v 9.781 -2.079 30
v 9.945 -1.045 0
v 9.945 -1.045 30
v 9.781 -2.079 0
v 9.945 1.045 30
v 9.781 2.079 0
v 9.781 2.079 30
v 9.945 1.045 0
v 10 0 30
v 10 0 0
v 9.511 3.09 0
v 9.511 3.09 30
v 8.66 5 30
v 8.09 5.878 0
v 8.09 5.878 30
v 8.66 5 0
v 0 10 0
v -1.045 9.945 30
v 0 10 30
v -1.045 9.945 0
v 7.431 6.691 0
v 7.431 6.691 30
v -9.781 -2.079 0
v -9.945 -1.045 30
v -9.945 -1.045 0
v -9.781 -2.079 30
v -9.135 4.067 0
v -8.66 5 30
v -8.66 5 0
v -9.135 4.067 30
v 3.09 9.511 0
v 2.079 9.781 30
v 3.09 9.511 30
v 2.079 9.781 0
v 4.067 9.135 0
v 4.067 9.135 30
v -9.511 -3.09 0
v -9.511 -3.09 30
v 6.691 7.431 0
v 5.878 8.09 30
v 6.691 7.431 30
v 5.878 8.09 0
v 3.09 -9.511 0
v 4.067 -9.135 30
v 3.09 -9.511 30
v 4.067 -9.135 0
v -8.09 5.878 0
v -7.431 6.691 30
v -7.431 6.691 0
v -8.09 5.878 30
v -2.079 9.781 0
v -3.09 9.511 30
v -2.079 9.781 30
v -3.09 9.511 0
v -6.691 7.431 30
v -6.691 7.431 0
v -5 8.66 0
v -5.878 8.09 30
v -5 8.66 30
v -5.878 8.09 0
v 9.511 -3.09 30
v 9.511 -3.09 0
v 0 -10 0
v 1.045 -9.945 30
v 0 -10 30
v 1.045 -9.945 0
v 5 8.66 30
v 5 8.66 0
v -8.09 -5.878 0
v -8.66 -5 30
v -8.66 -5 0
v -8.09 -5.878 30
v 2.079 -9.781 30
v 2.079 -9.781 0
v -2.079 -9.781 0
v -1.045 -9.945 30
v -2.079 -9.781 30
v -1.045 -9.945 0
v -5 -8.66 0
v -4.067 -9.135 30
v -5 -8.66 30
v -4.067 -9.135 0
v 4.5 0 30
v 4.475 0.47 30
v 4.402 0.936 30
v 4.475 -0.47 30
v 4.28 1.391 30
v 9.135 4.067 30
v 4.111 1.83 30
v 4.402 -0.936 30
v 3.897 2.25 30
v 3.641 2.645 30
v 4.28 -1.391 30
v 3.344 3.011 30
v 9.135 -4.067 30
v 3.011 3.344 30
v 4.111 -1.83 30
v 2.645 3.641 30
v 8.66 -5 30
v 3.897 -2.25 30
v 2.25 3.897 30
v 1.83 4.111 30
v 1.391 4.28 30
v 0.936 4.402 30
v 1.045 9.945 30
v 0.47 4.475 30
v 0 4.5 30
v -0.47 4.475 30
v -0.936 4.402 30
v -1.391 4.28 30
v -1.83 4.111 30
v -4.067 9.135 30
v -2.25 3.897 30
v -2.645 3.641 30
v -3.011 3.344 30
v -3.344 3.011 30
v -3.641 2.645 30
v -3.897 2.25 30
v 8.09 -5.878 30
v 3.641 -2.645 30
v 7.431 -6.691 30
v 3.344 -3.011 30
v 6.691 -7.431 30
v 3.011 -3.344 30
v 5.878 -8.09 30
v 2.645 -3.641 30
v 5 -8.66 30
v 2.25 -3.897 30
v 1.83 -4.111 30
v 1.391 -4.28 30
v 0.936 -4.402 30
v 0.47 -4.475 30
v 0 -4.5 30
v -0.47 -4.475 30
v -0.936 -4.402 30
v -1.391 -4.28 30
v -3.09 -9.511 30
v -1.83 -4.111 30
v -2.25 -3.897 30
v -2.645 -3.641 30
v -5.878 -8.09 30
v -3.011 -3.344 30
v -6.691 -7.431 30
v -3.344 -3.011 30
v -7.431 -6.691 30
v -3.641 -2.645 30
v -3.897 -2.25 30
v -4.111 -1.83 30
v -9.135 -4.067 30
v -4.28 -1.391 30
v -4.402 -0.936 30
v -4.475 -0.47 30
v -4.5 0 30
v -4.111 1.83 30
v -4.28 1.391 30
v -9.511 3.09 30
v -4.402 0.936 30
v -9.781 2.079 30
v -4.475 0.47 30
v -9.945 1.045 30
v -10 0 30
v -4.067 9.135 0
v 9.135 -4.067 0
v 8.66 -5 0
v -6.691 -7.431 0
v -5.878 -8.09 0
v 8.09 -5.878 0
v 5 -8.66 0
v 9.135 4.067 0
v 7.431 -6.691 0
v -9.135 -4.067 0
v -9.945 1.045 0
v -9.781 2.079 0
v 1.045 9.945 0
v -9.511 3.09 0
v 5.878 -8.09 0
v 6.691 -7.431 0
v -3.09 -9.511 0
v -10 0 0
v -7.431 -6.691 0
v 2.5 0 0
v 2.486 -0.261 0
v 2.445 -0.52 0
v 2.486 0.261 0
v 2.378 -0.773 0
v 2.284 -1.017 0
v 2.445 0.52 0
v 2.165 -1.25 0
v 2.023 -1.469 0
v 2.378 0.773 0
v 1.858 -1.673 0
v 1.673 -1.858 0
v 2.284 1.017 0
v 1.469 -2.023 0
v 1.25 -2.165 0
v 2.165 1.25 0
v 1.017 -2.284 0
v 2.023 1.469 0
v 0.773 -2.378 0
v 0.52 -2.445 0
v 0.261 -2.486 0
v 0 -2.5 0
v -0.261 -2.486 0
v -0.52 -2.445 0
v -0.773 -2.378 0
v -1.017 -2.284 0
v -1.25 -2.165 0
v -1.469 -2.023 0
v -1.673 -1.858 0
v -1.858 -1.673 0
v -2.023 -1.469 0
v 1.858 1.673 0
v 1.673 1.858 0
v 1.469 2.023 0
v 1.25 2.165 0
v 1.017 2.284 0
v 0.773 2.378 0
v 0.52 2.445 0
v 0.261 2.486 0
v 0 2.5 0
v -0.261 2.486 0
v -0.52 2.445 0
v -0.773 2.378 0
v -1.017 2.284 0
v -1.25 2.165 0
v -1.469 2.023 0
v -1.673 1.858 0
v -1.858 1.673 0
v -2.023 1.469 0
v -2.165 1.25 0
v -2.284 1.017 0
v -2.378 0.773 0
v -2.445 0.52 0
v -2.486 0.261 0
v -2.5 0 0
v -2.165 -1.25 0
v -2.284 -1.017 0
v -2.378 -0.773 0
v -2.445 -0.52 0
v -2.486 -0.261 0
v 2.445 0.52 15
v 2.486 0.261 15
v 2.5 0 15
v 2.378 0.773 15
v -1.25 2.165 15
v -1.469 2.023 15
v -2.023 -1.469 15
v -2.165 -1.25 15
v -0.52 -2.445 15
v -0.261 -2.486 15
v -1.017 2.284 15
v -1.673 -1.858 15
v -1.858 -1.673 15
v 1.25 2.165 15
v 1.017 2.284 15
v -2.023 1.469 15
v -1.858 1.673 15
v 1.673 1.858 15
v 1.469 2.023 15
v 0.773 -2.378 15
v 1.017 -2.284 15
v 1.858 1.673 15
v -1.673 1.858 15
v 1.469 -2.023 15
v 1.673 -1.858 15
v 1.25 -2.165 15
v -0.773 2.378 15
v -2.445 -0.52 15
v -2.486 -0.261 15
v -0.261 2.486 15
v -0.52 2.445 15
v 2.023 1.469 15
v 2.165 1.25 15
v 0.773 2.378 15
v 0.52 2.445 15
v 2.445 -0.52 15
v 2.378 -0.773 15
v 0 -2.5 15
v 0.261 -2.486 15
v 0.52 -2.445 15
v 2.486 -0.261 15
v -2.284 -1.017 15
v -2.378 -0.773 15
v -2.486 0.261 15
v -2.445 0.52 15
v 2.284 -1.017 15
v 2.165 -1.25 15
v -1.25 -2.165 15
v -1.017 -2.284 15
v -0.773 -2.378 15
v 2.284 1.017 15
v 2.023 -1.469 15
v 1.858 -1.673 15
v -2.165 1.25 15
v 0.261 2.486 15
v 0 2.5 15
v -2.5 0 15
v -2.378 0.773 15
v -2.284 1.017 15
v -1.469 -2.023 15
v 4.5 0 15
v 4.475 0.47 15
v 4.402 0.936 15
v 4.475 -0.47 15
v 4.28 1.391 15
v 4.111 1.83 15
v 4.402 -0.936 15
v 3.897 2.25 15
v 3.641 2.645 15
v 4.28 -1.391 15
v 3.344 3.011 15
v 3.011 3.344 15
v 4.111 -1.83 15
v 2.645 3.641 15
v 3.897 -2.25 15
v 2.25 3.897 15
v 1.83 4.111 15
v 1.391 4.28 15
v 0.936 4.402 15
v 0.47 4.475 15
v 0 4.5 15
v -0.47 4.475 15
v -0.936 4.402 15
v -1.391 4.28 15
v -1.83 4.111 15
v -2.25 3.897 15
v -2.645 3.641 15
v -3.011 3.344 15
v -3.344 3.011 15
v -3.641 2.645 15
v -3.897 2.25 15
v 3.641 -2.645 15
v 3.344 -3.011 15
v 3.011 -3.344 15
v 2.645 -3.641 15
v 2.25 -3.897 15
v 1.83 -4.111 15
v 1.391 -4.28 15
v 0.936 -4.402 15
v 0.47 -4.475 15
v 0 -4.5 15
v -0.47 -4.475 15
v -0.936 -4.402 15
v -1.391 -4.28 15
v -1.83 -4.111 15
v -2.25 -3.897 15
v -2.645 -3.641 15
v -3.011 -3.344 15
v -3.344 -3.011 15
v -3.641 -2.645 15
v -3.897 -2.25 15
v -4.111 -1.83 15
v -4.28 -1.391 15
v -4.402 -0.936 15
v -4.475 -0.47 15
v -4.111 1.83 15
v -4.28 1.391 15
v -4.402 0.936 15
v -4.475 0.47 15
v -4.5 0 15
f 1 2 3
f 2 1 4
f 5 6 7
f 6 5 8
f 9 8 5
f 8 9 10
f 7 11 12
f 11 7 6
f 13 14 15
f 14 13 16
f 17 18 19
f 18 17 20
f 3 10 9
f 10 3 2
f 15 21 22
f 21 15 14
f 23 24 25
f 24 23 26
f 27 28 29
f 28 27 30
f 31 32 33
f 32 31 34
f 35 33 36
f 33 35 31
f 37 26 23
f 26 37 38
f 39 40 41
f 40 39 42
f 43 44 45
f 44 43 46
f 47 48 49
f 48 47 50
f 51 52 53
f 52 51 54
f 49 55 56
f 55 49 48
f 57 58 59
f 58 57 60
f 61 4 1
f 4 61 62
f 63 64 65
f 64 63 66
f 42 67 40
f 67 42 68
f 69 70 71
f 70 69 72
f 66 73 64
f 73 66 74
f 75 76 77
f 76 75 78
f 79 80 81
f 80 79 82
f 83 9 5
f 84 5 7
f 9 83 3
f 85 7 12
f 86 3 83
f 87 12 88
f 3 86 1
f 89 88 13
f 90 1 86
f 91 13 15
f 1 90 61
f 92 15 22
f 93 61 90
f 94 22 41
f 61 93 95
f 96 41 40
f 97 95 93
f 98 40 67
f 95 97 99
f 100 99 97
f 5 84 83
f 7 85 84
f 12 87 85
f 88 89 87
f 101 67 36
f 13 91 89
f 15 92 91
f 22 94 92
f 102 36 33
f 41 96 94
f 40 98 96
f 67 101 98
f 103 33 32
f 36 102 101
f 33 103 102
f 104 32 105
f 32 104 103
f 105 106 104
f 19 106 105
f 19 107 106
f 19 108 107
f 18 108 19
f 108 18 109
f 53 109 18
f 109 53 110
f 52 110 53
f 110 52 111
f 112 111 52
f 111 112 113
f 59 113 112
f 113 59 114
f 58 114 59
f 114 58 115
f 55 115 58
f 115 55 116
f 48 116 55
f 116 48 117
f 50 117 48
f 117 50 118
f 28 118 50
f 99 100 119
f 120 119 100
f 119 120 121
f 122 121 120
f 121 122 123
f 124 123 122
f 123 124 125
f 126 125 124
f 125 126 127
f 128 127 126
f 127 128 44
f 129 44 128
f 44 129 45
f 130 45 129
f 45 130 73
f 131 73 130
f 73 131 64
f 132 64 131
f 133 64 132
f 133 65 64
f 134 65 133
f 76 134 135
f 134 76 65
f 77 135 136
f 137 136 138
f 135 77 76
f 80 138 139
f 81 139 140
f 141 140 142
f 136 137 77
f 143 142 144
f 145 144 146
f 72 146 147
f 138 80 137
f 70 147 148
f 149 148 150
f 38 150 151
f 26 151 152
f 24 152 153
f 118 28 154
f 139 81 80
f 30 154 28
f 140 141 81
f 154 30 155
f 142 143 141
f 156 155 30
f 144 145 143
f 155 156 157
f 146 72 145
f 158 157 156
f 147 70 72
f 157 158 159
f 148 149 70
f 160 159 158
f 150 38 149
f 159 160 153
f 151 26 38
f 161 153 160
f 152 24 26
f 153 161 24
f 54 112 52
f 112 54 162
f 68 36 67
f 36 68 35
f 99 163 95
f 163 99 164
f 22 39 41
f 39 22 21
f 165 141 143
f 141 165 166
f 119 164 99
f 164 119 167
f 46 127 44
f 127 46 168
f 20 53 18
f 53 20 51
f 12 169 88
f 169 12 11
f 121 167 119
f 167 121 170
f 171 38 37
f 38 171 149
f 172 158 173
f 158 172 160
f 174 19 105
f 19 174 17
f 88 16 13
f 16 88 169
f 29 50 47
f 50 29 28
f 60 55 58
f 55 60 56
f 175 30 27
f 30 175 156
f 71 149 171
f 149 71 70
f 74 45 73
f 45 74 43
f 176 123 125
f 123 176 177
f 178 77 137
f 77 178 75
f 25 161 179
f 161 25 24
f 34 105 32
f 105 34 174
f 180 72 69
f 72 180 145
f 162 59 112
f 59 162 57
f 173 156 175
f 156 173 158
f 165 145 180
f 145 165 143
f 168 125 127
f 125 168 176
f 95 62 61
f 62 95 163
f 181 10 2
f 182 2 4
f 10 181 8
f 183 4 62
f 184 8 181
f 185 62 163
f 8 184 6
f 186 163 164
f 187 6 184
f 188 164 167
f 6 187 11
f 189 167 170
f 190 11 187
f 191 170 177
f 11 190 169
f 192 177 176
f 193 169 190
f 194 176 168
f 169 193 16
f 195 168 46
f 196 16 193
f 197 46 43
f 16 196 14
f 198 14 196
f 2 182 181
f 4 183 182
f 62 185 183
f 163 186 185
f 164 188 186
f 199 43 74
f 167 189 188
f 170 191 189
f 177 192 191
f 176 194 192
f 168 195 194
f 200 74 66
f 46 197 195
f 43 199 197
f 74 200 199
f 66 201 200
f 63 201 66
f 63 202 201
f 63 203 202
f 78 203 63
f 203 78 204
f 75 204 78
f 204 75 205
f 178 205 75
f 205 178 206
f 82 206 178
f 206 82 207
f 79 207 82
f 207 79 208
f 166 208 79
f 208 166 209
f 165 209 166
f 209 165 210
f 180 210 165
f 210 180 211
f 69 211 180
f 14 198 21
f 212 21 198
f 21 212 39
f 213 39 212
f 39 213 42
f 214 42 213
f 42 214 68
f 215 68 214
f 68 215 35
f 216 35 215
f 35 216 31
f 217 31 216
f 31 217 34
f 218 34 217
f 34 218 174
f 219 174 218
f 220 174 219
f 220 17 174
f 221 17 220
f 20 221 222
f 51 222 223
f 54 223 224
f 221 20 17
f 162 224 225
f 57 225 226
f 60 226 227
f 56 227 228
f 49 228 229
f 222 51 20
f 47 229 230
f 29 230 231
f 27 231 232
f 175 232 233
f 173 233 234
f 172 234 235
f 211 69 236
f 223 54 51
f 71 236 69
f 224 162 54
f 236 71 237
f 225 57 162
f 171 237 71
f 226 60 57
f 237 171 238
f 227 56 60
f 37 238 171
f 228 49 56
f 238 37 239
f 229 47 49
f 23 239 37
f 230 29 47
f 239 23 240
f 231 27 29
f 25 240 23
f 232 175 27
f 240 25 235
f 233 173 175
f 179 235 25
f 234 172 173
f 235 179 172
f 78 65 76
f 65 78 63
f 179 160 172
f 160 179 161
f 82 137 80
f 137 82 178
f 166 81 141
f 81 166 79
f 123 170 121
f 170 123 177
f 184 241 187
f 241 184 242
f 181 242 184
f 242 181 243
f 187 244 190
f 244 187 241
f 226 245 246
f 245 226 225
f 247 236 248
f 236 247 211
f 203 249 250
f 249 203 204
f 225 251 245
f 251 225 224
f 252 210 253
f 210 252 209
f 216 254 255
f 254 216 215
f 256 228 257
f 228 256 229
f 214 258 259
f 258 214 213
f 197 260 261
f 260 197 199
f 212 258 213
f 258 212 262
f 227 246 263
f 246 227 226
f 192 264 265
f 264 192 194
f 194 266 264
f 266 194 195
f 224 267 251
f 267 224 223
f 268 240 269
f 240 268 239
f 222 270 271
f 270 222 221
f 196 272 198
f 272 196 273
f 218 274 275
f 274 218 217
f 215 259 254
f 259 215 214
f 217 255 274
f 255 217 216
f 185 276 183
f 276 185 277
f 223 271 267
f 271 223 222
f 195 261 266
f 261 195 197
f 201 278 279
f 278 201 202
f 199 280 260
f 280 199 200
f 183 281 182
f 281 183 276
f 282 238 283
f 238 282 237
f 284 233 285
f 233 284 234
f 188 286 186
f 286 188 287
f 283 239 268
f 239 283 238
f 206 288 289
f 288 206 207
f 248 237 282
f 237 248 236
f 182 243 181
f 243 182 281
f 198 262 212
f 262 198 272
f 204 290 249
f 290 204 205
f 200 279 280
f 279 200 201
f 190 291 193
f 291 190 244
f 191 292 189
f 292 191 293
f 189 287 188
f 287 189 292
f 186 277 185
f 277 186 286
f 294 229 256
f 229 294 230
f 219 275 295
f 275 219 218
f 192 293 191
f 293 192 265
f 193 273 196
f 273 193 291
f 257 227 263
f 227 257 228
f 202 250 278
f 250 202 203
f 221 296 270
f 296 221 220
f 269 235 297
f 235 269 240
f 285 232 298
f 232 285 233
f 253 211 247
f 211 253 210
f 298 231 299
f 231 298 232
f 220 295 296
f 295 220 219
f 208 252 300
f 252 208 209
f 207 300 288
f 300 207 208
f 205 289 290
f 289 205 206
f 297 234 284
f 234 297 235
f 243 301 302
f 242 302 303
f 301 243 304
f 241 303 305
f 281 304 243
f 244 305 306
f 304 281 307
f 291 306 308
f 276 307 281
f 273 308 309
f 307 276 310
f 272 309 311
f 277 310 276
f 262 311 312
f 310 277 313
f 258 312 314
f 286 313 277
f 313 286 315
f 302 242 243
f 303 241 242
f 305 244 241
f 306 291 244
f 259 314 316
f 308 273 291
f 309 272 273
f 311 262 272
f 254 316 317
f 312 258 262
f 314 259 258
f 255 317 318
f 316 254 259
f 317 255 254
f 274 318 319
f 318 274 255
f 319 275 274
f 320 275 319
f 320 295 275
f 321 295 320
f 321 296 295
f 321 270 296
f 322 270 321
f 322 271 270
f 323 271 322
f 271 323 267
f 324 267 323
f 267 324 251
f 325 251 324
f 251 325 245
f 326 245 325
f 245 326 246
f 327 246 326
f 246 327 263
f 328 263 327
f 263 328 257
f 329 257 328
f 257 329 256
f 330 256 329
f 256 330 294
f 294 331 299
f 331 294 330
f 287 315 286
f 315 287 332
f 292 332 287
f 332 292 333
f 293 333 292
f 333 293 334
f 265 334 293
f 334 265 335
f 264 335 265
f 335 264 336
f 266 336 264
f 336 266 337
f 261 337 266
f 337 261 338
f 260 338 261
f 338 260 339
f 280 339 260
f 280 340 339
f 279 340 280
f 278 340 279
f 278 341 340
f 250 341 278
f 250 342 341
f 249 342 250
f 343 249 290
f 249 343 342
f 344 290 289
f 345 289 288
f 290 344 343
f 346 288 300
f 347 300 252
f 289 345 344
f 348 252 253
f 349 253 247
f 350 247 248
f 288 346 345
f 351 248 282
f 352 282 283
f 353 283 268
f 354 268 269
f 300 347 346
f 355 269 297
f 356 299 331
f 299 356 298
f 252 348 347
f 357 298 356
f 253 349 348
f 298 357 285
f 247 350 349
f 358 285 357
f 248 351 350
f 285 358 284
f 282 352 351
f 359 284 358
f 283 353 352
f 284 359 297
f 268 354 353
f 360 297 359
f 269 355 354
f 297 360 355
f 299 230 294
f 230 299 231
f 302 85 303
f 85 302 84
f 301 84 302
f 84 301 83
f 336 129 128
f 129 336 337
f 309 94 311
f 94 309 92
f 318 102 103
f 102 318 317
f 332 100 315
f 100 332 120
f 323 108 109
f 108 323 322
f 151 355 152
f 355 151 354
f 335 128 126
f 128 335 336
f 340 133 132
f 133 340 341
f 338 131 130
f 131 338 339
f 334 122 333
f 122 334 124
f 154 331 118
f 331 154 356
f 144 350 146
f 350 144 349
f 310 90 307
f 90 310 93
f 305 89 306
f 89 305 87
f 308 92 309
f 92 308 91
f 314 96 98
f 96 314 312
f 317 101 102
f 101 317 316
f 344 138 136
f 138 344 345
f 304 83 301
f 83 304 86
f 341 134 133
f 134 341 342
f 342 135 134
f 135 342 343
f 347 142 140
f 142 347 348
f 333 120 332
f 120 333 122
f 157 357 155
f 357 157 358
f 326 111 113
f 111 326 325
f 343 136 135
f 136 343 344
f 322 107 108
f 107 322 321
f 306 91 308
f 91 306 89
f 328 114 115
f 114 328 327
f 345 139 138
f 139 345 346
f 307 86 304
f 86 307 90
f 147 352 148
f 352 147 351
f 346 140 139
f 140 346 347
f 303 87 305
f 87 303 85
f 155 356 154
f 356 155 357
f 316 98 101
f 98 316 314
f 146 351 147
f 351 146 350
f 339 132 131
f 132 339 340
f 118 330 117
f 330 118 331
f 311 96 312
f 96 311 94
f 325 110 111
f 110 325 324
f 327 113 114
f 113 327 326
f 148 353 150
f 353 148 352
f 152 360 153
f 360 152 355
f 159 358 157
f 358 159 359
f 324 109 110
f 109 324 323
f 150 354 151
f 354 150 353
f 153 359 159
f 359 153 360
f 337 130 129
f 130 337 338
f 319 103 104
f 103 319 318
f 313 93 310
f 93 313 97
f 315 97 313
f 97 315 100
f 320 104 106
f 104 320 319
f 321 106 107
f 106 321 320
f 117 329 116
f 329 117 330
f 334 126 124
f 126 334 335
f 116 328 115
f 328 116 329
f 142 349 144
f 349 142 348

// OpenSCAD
outerD=20;
rodD=9;
stepD=5;
height=30;

difference(){
    cylinder(d=outerD, h=height, $fn=60, center=false);
    cylinder(d=stepD, h=height/2, $fn=60, center=false);
    translate([0,0,height/2]) cylinder(d=rodD, h=height/2, $fn=60, center=false);
}
